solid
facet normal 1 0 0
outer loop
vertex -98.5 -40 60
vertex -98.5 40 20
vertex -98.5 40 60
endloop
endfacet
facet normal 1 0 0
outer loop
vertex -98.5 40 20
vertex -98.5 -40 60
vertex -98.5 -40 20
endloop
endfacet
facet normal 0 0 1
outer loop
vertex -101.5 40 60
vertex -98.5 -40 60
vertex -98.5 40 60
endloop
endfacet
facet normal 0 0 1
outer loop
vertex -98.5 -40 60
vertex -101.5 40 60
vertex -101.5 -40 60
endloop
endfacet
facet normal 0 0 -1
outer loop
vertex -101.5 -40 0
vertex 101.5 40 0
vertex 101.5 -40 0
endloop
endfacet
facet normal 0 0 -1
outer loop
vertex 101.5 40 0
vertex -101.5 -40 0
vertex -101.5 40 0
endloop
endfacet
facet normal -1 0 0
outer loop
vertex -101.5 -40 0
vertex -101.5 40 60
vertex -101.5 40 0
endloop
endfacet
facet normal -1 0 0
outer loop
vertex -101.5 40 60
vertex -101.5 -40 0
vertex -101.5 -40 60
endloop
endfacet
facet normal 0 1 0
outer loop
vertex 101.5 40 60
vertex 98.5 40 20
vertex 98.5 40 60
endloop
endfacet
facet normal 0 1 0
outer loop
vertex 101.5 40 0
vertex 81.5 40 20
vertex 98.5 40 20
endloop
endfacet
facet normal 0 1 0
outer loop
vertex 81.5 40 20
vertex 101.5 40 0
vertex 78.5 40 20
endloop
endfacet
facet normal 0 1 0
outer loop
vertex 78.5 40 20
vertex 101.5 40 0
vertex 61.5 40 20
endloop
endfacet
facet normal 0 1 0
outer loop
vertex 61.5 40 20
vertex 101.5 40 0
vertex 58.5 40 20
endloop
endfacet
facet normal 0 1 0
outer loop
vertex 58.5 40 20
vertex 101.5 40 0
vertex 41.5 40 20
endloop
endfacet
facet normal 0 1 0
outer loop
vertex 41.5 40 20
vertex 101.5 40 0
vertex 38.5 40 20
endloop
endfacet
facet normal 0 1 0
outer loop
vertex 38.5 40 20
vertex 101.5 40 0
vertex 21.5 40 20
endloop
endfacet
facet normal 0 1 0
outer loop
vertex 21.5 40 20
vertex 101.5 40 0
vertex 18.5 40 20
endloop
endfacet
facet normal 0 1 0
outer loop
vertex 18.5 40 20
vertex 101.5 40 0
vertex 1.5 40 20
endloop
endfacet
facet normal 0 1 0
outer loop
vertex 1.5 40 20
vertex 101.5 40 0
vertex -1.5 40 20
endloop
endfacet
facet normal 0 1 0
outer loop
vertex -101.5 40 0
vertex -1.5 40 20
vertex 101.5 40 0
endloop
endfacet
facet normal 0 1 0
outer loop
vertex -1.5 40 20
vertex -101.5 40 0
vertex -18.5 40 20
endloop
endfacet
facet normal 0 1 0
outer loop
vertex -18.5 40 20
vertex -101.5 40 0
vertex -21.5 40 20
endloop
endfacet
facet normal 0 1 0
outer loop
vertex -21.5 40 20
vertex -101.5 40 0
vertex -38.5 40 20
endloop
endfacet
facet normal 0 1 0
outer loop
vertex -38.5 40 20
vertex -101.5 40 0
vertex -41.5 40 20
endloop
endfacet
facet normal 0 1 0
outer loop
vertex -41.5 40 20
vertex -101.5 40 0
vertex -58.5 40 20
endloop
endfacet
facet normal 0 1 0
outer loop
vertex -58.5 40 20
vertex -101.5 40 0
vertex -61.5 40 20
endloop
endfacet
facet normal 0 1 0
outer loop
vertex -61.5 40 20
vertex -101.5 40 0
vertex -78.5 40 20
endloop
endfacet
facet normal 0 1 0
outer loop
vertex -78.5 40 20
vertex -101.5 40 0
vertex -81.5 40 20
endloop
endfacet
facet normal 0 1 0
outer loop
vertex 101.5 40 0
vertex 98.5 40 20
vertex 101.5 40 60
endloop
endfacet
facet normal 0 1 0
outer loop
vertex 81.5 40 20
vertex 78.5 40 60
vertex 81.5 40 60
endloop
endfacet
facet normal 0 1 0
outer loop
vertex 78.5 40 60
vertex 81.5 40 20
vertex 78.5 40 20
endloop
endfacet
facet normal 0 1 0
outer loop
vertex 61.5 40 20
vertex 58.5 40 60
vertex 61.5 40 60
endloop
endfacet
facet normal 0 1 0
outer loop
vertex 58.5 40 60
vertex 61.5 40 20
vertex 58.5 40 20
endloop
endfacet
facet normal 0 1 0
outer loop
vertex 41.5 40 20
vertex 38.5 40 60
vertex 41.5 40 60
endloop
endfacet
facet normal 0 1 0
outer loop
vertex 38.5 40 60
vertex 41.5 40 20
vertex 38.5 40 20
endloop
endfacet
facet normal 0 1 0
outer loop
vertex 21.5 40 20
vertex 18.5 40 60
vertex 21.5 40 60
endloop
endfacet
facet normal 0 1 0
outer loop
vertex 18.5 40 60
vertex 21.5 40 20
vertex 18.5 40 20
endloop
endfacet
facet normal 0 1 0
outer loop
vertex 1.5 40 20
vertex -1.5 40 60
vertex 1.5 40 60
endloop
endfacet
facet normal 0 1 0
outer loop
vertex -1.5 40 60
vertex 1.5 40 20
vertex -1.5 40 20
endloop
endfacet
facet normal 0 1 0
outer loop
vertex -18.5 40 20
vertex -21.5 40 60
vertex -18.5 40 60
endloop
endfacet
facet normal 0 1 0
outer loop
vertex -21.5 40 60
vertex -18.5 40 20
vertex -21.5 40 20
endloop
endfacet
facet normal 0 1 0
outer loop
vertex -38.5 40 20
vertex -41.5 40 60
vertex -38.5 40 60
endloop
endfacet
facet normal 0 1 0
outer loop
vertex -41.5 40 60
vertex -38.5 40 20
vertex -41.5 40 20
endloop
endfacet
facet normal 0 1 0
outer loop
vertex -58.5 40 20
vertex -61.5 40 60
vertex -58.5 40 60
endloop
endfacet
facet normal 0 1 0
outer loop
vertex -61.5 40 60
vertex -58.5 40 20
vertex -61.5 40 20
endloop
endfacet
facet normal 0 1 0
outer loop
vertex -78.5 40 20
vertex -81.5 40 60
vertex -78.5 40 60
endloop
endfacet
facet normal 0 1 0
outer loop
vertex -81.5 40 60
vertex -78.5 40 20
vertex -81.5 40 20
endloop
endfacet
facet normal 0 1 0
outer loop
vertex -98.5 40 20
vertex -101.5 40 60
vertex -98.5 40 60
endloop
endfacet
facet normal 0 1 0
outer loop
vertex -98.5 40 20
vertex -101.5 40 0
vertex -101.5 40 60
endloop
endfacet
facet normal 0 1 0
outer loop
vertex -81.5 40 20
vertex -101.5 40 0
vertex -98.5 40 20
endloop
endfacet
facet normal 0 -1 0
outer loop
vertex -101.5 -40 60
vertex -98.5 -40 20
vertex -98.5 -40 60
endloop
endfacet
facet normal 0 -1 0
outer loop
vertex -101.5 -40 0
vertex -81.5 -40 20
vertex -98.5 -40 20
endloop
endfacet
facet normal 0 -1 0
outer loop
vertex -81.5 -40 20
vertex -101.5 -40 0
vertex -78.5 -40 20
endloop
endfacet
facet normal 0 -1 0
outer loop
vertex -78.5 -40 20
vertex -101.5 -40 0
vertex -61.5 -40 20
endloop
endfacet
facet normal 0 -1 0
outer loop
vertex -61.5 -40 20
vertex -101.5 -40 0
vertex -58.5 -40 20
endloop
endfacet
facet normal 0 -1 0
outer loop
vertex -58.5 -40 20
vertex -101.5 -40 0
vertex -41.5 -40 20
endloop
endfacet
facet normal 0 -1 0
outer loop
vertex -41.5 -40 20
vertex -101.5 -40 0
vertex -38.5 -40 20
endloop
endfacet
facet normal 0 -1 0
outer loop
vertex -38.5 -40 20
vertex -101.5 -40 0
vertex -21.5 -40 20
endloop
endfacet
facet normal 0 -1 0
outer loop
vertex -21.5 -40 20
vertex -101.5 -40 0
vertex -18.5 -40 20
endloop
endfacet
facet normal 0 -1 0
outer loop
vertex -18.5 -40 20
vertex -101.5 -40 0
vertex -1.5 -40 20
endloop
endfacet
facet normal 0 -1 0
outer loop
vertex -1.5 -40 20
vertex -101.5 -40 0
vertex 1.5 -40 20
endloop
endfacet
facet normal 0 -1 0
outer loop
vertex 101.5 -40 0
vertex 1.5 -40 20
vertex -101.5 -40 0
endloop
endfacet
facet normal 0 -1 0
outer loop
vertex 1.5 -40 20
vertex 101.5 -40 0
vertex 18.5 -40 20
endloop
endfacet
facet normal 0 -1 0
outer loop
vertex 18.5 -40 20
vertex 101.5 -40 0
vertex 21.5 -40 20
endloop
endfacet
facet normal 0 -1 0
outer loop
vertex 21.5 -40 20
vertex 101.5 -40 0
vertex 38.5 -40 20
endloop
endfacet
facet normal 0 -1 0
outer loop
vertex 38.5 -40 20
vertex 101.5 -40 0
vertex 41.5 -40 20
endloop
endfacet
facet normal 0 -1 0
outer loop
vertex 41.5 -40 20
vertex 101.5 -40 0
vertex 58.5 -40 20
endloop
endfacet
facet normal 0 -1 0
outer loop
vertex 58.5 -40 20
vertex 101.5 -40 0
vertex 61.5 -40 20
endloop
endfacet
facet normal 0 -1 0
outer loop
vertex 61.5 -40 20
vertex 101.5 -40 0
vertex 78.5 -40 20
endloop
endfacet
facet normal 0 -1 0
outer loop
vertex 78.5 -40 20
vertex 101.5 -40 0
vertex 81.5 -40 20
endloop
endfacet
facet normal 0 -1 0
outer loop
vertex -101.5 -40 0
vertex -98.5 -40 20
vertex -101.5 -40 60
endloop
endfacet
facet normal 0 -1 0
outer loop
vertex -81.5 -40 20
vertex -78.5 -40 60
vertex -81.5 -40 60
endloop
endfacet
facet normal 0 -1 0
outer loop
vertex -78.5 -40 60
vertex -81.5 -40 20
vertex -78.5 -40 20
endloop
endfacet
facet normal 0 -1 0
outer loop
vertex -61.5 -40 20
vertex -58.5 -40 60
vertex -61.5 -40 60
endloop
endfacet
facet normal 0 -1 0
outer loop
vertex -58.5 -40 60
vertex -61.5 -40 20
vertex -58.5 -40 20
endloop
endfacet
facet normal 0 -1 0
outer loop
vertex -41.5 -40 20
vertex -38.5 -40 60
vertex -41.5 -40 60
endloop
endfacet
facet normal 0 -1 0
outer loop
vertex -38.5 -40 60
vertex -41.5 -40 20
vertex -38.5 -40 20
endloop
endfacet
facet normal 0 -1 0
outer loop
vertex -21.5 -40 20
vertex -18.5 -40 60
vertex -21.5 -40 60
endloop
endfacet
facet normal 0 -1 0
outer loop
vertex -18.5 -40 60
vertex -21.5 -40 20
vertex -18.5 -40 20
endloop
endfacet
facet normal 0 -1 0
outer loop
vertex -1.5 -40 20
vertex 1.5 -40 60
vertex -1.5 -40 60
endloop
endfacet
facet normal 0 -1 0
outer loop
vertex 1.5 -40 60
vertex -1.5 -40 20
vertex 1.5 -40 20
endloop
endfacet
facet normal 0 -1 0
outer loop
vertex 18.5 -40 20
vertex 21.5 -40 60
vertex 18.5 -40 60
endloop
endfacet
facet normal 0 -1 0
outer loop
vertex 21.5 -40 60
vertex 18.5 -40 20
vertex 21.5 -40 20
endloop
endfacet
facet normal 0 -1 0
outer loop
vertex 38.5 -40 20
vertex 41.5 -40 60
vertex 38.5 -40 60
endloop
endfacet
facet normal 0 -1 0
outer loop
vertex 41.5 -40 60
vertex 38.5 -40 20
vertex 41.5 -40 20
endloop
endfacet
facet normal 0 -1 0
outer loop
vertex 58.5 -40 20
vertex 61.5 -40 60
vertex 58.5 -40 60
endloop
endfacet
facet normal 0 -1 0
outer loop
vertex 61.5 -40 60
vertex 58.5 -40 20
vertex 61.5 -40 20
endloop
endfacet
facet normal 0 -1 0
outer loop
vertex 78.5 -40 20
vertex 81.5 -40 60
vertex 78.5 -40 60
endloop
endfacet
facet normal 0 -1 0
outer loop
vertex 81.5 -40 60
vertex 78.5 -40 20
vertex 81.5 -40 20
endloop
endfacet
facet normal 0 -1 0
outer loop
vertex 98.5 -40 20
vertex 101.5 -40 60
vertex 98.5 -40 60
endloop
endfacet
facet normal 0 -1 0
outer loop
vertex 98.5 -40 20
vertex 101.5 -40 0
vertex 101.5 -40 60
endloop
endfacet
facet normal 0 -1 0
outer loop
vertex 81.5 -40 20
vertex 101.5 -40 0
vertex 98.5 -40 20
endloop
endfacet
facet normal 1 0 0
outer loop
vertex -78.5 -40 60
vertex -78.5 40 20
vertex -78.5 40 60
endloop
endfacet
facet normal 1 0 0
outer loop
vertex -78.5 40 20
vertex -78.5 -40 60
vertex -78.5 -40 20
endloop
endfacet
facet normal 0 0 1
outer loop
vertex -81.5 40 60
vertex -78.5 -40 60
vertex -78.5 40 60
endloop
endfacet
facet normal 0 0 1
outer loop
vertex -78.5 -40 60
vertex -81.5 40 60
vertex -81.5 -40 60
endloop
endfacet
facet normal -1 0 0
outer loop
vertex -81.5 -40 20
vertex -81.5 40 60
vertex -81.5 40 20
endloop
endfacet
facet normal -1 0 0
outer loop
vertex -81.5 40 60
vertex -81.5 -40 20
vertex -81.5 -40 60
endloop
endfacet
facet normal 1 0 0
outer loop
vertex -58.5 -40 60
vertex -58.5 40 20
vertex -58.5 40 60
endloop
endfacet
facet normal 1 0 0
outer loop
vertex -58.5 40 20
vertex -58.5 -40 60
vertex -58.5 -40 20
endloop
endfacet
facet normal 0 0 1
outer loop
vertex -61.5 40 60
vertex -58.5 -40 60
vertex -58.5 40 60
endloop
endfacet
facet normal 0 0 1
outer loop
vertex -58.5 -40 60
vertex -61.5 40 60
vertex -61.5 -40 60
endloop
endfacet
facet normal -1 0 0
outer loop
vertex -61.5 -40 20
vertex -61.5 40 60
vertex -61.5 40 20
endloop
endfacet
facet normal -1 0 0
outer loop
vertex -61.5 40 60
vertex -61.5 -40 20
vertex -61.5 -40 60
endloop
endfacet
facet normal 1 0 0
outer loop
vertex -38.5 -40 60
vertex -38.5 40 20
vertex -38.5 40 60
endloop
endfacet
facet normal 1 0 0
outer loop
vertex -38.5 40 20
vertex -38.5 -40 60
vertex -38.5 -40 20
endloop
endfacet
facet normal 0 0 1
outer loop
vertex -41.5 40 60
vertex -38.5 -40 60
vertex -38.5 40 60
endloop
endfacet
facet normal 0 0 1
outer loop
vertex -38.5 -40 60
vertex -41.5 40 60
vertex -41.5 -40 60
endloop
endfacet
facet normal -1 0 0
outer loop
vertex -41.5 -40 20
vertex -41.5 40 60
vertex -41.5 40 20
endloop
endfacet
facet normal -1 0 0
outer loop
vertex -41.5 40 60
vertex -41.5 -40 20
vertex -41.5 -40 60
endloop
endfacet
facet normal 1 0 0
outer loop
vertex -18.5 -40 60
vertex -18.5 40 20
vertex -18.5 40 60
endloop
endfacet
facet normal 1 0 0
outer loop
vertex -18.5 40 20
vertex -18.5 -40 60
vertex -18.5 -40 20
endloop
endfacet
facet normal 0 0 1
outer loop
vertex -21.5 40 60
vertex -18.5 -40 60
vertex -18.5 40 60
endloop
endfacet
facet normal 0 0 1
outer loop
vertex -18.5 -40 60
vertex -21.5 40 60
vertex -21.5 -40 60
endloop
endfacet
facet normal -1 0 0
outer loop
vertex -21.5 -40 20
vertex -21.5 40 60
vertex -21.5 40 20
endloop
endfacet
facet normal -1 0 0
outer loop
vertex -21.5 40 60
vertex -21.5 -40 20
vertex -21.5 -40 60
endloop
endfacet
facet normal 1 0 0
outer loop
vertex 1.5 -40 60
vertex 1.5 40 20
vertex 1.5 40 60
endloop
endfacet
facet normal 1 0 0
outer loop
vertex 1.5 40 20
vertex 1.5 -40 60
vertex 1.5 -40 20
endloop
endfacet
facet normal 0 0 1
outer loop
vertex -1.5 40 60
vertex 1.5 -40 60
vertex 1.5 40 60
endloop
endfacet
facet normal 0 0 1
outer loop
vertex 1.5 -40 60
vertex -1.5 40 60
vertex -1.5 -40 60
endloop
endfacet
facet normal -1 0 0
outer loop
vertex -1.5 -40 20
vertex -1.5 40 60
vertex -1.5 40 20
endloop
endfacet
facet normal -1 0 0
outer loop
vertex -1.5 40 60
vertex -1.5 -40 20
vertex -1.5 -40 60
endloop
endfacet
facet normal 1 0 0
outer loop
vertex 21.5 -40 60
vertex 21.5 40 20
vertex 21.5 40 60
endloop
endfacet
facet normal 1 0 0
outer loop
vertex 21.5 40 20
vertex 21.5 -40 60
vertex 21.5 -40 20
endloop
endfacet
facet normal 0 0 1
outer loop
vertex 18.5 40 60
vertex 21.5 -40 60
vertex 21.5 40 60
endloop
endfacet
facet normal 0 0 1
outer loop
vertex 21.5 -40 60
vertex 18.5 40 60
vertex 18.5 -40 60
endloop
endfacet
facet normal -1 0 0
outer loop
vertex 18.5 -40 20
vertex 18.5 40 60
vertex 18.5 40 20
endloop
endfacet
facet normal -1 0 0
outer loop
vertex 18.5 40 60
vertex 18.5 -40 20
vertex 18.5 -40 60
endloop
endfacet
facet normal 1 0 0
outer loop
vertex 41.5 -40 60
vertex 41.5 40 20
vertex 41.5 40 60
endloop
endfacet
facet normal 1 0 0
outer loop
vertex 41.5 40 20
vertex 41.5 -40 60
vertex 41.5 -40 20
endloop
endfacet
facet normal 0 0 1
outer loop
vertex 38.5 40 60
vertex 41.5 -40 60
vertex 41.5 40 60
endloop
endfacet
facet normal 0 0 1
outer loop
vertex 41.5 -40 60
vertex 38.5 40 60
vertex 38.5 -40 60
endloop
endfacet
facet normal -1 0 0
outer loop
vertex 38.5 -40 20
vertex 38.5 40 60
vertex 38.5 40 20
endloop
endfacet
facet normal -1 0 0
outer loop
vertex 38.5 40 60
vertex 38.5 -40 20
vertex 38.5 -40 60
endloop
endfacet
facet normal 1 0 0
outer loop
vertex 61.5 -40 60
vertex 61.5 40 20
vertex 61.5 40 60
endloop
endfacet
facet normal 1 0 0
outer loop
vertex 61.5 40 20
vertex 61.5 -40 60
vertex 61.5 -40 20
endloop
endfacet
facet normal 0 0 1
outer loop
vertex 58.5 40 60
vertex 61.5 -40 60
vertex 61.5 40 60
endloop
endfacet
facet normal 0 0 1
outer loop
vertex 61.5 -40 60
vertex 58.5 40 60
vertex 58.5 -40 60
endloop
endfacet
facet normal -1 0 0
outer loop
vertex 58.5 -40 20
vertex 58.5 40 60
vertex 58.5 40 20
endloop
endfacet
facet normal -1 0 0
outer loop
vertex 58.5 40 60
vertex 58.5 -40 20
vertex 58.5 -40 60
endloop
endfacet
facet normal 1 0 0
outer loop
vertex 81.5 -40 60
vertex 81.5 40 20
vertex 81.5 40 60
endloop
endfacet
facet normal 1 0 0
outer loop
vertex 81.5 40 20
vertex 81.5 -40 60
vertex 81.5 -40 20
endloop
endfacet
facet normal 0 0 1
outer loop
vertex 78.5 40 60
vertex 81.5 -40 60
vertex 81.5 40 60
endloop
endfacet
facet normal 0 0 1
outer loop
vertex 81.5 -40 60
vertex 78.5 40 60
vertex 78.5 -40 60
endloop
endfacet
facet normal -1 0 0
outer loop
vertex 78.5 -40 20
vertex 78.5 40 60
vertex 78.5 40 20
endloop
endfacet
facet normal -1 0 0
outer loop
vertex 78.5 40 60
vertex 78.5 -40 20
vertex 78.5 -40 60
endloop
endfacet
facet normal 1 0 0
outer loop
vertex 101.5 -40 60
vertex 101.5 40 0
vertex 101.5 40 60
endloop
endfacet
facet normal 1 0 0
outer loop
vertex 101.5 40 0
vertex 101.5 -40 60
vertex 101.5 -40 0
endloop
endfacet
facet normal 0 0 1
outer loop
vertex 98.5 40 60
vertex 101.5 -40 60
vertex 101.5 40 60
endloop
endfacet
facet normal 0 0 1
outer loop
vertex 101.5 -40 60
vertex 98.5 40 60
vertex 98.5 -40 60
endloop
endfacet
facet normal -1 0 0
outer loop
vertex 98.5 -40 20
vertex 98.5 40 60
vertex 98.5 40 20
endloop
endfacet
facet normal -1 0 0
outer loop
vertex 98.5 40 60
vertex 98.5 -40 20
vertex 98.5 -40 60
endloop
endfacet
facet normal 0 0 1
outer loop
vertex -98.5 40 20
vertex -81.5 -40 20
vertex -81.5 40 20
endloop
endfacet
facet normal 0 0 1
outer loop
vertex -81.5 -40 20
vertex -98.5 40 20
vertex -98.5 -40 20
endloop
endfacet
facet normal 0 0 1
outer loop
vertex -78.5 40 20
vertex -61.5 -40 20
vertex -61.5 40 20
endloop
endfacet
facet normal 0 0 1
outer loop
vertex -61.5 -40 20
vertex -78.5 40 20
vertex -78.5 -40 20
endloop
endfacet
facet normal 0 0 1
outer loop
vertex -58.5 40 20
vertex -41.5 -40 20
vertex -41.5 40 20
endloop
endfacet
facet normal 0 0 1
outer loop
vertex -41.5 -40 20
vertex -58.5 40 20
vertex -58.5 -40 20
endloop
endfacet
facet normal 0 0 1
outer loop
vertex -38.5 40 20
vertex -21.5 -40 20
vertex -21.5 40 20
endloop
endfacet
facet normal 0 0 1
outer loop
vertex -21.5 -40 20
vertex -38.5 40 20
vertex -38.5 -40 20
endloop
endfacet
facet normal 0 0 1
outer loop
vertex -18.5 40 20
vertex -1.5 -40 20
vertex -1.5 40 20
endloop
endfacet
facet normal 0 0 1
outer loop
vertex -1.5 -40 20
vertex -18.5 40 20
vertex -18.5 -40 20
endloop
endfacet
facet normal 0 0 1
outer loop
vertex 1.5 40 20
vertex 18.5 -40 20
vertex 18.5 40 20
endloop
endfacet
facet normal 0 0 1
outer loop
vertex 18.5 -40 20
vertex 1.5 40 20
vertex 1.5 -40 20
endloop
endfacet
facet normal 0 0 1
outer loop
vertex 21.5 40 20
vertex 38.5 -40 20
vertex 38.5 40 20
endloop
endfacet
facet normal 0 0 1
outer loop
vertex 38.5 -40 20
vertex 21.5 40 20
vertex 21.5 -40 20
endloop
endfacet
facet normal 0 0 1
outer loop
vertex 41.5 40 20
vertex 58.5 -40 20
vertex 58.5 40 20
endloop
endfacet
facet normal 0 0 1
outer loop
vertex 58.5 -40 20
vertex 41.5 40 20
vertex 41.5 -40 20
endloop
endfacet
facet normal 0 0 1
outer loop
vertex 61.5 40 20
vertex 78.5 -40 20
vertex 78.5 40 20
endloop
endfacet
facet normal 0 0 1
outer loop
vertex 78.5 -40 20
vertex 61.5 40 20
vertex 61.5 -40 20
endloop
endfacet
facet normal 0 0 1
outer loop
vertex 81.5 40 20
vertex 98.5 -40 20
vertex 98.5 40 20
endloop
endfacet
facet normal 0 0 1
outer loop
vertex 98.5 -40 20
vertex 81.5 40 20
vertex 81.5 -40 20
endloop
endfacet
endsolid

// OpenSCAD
// 10-dish rack: 203 x 80 x 20 base, 11 dividers, 10 slots, X-axis cradle
$fn = 64;

// Base block dimensions
base_L = 203;   // length along X
base_W = 80;    // width along Y
base_H = 20;    // height along Z

// Divider plates
div_t   = 3;    // thickness along X
div_H   = 60;   // height above z = 0
div_W   = 80;   // full base width along Y
div_xs  = [-100, -80, -60, -40, -20, 0, 20, 40, 60, 80, 100];

// Curved cradle (dish rim) cutter
crad_R  = 46;   // radius of the dish rim
crad_cy = 0;    // axis Y position
crad_cz = 52;   // axis Z position  (bottoms out at z = 6)
crad_L  = 203;  // full length along X

// Build the solid: base + 11 divider plates, then remove the cradle
// (the cradle is NOT cut through the dividers, so it is subtracted
//  from the base only)
module base_and_dividers() { union() {
    // Base block, centred on origin in X and Y, resting on z = 0
    translate([-base_L/2, -base_W/2, 0])
        cube([base_L, base_W, base_H]);

    // Eleven divider plates rising from z = 0 to z = 60
    for (dx = div_xs)
        translate([dx - div_t/2, -div_W/2, 0])
            cube([div_t, div_W, div_H]);
} }

// Cradle cutter: a cylinder of radius 46 whose axis runs along X.
// Rotate the cylinder 90 deg about Y so its local +Z axis points along
// world +X, then translate the axis to y = 0, z = 52. The cylinder is
// made 1 mm longer than the base on each end so the cut is clean and no
// faces are exactly coplanar with the base ends.
module cradle_cutter() {
    rotate([90, 0, 0])
    translate([0, crad_cy, crad_cz])
    cylinder(h = crad_L + 2, r = crad_R, $fn = $fn);
}

// Final part: cradle cut from the base only (dividers stay solid)
difference() {
    base_and_dividers();
    cradle_cutter();
}
